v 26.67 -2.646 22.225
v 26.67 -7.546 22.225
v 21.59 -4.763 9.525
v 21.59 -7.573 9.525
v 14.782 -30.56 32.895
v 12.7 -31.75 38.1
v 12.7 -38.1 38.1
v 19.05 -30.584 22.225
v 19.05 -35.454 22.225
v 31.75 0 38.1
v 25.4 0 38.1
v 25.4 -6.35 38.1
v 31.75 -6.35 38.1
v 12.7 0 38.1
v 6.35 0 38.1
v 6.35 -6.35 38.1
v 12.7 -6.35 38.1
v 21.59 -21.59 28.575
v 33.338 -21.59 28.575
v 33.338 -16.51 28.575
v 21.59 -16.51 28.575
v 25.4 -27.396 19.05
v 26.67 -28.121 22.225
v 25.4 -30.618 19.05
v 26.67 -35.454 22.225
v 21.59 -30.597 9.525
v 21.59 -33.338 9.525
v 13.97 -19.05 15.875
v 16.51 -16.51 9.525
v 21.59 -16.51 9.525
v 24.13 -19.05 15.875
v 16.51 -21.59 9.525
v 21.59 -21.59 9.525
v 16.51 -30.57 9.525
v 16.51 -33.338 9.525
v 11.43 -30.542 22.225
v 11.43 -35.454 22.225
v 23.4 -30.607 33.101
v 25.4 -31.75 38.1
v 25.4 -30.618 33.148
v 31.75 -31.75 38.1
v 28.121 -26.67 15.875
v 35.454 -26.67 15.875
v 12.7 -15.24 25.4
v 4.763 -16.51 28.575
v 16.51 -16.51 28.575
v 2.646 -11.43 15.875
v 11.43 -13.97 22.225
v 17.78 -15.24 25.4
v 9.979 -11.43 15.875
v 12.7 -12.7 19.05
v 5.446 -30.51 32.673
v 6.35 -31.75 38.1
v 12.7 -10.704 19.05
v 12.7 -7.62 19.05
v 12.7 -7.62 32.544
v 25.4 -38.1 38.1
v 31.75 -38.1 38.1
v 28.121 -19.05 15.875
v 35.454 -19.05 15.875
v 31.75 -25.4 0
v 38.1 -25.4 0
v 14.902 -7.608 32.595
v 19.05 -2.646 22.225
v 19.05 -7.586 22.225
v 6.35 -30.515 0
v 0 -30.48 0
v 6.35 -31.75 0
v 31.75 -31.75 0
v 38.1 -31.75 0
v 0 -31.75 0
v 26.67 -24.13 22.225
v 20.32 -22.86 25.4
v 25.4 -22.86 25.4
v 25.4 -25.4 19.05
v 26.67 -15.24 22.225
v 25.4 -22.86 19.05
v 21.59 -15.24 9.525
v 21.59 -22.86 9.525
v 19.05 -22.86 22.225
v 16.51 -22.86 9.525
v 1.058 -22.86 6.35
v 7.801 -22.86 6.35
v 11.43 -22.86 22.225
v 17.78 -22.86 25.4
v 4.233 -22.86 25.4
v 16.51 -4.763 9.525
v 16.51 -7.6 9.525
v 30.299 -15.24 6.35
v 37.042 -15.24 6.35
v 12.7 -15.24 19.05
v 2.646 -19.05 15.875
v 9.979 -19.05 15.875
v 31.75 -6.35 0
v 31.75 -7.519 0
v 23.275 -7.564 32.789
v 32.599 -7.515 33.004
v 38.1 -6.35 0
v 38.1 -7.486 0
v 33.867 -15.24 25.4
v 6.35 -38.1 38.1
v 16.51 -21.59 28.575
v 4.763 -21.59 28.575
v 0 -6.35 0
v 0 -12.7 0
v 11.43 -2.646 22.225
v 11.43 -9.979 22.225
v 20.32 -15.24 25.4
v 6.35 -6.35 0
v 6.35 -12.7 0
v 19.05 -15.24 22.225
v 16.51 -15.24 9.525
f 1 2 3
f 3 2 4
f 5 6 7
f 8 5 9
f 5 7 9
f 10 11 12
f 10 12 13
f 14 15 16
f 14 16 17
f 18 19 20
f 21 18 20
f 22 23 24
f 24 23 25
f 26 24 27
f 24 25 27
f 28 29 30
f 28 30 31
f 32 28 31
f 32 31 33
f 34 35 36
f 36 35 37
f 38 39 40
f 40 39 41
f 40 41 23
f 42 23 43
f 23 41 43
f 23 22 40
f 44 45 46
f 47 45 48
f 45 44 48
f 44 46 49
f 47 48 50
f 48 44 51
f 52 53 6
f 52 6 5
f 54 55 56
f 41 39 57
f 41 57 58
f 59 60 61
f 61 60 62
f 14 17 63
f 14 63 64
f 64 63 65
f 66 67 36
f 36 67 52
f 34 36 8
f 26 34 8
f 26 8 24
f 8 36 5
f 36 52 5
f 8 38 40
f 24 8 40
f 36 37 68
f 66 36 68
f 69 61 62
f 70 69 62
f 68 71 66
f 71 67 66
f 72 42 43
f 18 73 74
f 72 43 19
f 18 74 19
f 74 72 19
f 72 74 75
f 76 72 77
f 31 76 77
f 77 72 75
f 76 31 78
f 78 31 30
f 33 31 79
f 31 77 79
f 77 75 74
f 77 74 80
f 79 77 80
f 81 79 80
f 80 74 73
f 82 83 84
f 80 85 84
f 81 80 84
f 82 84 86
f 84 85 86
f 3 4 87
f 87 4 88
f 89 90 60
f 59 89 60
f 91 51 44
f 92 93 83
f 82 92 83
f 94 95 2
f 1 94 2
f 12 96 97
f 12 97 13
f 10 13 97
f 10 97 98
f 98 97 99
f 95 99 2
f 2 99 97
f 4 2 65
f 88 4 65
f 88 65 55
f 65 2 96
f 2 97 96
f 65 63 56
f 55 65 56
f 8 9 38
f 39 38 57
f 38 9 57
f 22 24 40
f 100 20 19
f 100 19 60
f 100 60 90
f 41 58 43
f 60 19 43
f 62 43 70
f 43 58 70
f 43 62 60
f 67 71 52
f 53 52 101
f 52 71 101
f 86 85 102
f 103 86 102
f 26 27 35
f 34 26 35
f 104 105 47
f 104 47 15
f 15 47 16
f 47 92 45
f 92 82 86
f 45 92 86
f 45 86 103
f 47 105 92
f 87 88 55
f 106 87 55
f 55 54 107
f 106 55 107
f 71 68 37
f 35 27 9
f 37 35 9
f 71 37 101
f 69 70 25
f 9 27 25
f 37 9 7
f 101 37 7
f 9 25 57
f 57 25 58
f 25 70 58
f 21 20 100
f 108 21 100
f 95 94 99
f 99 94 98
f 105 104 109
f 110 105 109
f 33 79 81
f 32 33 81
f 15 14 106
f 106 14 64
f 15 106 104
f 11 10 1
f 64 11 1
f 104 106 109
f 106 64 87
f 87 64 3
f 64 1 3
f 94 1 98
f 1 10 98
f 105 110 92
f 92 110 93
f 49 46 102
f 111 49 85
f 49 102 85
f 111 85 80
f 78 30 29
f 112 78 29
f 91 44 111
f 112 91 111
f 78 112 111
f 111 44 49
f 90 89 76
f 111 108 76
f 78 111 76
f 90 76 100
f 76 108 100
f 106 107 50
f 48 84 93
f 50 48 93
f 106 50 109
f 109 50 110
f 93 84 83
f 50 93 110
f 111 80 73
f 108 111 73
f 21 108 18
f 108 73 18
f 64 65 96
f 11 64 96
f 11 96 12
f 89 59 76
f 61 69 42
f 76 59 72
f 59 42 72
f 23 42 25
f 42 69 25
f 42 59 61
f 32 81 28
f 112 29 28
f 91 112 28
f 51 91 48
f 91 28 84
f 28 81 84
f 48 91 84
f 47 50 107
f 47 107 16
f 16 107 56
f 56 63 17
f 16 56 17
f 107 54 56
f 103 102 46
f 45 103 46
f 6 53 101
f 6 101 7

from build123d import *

# Parameters (mm, degrees)
F0_W      = 38.1
F0_H      = 38.1
F1_DEPTH  = 38.1
F6_DEPTH  = 38.1
F8_DEPTH  = 38.1
F10_DEPTH = 38.1


with BuildPart() as f1:
    # F0 (on Front) → F1 (new body)
    with BuildSketch(Plane.XZ):
        with Locations((19.05, 19.05)):
            Rectangle(F0_W, F0_H)
    extrude(amount=F1_DEPTH)

    # F5 (on offset) → F6 (cut)
    with BuildSketch(Plane.YZ.offset(38.1)):
        Polygon((-6.35, 0), (0, 0), (0, 38.1), align=None)
        Polygon((-25.4, 0), (-12.7, 0), (-19.05, 15.875), align=None)
        Polygon((-31.75, 0), (-38.1, 38.1), (-38.1, 0), align=None)
        Polygon((-11.43, 15.875), (-6.35, 38.1), (-31.75, 38.1), (-26.67, 15.875), (-21.59, 28.575), (-16.51, 28.575), align=None)
    extrude(amount=-F6_DEPTH, mode=Mode.SUBTRACT)

    # F7 (on offset) → F8 (cut)
    with BuildSketch(Plane.XZ.offset(38.1)):
        Polygon((25.4, 38.1), (12.7, 38.1), (19.05, 22.225), align=None)
        Polygon((38.1, 38.1), (31.75, 38.1), (38.1, 0), align=None)
        Polygon((11.43, 22.225), (6.35, 0), (31.75, 0), (26.67, 22.225), (21.59, 9.525), (16.51, 9.525), align=None)
        Polygon((6.35, 38.1), (0, 38.1), (0, 0), align=None)
    extrude(amount=-F8_DEPTH, mode=Mode.SUBTRACT)

    # F9 (on offset) → F10 (cut)
    with BuildSketch(Plane.XY.offset(38.1)):
        Polygon((38.1, -15.24), (38.1, -7.485609), (12.7, -7.62), (12.7, -15.24), align=None)
        Polygon((25.4, -22.86), (0, -22.86), (0, -30.480013), (25.4, -30.618137), align=None)
    extrude(amount=-F10_DEPTH, mode=Mode.SUBTRACT)


solid = f1.part
